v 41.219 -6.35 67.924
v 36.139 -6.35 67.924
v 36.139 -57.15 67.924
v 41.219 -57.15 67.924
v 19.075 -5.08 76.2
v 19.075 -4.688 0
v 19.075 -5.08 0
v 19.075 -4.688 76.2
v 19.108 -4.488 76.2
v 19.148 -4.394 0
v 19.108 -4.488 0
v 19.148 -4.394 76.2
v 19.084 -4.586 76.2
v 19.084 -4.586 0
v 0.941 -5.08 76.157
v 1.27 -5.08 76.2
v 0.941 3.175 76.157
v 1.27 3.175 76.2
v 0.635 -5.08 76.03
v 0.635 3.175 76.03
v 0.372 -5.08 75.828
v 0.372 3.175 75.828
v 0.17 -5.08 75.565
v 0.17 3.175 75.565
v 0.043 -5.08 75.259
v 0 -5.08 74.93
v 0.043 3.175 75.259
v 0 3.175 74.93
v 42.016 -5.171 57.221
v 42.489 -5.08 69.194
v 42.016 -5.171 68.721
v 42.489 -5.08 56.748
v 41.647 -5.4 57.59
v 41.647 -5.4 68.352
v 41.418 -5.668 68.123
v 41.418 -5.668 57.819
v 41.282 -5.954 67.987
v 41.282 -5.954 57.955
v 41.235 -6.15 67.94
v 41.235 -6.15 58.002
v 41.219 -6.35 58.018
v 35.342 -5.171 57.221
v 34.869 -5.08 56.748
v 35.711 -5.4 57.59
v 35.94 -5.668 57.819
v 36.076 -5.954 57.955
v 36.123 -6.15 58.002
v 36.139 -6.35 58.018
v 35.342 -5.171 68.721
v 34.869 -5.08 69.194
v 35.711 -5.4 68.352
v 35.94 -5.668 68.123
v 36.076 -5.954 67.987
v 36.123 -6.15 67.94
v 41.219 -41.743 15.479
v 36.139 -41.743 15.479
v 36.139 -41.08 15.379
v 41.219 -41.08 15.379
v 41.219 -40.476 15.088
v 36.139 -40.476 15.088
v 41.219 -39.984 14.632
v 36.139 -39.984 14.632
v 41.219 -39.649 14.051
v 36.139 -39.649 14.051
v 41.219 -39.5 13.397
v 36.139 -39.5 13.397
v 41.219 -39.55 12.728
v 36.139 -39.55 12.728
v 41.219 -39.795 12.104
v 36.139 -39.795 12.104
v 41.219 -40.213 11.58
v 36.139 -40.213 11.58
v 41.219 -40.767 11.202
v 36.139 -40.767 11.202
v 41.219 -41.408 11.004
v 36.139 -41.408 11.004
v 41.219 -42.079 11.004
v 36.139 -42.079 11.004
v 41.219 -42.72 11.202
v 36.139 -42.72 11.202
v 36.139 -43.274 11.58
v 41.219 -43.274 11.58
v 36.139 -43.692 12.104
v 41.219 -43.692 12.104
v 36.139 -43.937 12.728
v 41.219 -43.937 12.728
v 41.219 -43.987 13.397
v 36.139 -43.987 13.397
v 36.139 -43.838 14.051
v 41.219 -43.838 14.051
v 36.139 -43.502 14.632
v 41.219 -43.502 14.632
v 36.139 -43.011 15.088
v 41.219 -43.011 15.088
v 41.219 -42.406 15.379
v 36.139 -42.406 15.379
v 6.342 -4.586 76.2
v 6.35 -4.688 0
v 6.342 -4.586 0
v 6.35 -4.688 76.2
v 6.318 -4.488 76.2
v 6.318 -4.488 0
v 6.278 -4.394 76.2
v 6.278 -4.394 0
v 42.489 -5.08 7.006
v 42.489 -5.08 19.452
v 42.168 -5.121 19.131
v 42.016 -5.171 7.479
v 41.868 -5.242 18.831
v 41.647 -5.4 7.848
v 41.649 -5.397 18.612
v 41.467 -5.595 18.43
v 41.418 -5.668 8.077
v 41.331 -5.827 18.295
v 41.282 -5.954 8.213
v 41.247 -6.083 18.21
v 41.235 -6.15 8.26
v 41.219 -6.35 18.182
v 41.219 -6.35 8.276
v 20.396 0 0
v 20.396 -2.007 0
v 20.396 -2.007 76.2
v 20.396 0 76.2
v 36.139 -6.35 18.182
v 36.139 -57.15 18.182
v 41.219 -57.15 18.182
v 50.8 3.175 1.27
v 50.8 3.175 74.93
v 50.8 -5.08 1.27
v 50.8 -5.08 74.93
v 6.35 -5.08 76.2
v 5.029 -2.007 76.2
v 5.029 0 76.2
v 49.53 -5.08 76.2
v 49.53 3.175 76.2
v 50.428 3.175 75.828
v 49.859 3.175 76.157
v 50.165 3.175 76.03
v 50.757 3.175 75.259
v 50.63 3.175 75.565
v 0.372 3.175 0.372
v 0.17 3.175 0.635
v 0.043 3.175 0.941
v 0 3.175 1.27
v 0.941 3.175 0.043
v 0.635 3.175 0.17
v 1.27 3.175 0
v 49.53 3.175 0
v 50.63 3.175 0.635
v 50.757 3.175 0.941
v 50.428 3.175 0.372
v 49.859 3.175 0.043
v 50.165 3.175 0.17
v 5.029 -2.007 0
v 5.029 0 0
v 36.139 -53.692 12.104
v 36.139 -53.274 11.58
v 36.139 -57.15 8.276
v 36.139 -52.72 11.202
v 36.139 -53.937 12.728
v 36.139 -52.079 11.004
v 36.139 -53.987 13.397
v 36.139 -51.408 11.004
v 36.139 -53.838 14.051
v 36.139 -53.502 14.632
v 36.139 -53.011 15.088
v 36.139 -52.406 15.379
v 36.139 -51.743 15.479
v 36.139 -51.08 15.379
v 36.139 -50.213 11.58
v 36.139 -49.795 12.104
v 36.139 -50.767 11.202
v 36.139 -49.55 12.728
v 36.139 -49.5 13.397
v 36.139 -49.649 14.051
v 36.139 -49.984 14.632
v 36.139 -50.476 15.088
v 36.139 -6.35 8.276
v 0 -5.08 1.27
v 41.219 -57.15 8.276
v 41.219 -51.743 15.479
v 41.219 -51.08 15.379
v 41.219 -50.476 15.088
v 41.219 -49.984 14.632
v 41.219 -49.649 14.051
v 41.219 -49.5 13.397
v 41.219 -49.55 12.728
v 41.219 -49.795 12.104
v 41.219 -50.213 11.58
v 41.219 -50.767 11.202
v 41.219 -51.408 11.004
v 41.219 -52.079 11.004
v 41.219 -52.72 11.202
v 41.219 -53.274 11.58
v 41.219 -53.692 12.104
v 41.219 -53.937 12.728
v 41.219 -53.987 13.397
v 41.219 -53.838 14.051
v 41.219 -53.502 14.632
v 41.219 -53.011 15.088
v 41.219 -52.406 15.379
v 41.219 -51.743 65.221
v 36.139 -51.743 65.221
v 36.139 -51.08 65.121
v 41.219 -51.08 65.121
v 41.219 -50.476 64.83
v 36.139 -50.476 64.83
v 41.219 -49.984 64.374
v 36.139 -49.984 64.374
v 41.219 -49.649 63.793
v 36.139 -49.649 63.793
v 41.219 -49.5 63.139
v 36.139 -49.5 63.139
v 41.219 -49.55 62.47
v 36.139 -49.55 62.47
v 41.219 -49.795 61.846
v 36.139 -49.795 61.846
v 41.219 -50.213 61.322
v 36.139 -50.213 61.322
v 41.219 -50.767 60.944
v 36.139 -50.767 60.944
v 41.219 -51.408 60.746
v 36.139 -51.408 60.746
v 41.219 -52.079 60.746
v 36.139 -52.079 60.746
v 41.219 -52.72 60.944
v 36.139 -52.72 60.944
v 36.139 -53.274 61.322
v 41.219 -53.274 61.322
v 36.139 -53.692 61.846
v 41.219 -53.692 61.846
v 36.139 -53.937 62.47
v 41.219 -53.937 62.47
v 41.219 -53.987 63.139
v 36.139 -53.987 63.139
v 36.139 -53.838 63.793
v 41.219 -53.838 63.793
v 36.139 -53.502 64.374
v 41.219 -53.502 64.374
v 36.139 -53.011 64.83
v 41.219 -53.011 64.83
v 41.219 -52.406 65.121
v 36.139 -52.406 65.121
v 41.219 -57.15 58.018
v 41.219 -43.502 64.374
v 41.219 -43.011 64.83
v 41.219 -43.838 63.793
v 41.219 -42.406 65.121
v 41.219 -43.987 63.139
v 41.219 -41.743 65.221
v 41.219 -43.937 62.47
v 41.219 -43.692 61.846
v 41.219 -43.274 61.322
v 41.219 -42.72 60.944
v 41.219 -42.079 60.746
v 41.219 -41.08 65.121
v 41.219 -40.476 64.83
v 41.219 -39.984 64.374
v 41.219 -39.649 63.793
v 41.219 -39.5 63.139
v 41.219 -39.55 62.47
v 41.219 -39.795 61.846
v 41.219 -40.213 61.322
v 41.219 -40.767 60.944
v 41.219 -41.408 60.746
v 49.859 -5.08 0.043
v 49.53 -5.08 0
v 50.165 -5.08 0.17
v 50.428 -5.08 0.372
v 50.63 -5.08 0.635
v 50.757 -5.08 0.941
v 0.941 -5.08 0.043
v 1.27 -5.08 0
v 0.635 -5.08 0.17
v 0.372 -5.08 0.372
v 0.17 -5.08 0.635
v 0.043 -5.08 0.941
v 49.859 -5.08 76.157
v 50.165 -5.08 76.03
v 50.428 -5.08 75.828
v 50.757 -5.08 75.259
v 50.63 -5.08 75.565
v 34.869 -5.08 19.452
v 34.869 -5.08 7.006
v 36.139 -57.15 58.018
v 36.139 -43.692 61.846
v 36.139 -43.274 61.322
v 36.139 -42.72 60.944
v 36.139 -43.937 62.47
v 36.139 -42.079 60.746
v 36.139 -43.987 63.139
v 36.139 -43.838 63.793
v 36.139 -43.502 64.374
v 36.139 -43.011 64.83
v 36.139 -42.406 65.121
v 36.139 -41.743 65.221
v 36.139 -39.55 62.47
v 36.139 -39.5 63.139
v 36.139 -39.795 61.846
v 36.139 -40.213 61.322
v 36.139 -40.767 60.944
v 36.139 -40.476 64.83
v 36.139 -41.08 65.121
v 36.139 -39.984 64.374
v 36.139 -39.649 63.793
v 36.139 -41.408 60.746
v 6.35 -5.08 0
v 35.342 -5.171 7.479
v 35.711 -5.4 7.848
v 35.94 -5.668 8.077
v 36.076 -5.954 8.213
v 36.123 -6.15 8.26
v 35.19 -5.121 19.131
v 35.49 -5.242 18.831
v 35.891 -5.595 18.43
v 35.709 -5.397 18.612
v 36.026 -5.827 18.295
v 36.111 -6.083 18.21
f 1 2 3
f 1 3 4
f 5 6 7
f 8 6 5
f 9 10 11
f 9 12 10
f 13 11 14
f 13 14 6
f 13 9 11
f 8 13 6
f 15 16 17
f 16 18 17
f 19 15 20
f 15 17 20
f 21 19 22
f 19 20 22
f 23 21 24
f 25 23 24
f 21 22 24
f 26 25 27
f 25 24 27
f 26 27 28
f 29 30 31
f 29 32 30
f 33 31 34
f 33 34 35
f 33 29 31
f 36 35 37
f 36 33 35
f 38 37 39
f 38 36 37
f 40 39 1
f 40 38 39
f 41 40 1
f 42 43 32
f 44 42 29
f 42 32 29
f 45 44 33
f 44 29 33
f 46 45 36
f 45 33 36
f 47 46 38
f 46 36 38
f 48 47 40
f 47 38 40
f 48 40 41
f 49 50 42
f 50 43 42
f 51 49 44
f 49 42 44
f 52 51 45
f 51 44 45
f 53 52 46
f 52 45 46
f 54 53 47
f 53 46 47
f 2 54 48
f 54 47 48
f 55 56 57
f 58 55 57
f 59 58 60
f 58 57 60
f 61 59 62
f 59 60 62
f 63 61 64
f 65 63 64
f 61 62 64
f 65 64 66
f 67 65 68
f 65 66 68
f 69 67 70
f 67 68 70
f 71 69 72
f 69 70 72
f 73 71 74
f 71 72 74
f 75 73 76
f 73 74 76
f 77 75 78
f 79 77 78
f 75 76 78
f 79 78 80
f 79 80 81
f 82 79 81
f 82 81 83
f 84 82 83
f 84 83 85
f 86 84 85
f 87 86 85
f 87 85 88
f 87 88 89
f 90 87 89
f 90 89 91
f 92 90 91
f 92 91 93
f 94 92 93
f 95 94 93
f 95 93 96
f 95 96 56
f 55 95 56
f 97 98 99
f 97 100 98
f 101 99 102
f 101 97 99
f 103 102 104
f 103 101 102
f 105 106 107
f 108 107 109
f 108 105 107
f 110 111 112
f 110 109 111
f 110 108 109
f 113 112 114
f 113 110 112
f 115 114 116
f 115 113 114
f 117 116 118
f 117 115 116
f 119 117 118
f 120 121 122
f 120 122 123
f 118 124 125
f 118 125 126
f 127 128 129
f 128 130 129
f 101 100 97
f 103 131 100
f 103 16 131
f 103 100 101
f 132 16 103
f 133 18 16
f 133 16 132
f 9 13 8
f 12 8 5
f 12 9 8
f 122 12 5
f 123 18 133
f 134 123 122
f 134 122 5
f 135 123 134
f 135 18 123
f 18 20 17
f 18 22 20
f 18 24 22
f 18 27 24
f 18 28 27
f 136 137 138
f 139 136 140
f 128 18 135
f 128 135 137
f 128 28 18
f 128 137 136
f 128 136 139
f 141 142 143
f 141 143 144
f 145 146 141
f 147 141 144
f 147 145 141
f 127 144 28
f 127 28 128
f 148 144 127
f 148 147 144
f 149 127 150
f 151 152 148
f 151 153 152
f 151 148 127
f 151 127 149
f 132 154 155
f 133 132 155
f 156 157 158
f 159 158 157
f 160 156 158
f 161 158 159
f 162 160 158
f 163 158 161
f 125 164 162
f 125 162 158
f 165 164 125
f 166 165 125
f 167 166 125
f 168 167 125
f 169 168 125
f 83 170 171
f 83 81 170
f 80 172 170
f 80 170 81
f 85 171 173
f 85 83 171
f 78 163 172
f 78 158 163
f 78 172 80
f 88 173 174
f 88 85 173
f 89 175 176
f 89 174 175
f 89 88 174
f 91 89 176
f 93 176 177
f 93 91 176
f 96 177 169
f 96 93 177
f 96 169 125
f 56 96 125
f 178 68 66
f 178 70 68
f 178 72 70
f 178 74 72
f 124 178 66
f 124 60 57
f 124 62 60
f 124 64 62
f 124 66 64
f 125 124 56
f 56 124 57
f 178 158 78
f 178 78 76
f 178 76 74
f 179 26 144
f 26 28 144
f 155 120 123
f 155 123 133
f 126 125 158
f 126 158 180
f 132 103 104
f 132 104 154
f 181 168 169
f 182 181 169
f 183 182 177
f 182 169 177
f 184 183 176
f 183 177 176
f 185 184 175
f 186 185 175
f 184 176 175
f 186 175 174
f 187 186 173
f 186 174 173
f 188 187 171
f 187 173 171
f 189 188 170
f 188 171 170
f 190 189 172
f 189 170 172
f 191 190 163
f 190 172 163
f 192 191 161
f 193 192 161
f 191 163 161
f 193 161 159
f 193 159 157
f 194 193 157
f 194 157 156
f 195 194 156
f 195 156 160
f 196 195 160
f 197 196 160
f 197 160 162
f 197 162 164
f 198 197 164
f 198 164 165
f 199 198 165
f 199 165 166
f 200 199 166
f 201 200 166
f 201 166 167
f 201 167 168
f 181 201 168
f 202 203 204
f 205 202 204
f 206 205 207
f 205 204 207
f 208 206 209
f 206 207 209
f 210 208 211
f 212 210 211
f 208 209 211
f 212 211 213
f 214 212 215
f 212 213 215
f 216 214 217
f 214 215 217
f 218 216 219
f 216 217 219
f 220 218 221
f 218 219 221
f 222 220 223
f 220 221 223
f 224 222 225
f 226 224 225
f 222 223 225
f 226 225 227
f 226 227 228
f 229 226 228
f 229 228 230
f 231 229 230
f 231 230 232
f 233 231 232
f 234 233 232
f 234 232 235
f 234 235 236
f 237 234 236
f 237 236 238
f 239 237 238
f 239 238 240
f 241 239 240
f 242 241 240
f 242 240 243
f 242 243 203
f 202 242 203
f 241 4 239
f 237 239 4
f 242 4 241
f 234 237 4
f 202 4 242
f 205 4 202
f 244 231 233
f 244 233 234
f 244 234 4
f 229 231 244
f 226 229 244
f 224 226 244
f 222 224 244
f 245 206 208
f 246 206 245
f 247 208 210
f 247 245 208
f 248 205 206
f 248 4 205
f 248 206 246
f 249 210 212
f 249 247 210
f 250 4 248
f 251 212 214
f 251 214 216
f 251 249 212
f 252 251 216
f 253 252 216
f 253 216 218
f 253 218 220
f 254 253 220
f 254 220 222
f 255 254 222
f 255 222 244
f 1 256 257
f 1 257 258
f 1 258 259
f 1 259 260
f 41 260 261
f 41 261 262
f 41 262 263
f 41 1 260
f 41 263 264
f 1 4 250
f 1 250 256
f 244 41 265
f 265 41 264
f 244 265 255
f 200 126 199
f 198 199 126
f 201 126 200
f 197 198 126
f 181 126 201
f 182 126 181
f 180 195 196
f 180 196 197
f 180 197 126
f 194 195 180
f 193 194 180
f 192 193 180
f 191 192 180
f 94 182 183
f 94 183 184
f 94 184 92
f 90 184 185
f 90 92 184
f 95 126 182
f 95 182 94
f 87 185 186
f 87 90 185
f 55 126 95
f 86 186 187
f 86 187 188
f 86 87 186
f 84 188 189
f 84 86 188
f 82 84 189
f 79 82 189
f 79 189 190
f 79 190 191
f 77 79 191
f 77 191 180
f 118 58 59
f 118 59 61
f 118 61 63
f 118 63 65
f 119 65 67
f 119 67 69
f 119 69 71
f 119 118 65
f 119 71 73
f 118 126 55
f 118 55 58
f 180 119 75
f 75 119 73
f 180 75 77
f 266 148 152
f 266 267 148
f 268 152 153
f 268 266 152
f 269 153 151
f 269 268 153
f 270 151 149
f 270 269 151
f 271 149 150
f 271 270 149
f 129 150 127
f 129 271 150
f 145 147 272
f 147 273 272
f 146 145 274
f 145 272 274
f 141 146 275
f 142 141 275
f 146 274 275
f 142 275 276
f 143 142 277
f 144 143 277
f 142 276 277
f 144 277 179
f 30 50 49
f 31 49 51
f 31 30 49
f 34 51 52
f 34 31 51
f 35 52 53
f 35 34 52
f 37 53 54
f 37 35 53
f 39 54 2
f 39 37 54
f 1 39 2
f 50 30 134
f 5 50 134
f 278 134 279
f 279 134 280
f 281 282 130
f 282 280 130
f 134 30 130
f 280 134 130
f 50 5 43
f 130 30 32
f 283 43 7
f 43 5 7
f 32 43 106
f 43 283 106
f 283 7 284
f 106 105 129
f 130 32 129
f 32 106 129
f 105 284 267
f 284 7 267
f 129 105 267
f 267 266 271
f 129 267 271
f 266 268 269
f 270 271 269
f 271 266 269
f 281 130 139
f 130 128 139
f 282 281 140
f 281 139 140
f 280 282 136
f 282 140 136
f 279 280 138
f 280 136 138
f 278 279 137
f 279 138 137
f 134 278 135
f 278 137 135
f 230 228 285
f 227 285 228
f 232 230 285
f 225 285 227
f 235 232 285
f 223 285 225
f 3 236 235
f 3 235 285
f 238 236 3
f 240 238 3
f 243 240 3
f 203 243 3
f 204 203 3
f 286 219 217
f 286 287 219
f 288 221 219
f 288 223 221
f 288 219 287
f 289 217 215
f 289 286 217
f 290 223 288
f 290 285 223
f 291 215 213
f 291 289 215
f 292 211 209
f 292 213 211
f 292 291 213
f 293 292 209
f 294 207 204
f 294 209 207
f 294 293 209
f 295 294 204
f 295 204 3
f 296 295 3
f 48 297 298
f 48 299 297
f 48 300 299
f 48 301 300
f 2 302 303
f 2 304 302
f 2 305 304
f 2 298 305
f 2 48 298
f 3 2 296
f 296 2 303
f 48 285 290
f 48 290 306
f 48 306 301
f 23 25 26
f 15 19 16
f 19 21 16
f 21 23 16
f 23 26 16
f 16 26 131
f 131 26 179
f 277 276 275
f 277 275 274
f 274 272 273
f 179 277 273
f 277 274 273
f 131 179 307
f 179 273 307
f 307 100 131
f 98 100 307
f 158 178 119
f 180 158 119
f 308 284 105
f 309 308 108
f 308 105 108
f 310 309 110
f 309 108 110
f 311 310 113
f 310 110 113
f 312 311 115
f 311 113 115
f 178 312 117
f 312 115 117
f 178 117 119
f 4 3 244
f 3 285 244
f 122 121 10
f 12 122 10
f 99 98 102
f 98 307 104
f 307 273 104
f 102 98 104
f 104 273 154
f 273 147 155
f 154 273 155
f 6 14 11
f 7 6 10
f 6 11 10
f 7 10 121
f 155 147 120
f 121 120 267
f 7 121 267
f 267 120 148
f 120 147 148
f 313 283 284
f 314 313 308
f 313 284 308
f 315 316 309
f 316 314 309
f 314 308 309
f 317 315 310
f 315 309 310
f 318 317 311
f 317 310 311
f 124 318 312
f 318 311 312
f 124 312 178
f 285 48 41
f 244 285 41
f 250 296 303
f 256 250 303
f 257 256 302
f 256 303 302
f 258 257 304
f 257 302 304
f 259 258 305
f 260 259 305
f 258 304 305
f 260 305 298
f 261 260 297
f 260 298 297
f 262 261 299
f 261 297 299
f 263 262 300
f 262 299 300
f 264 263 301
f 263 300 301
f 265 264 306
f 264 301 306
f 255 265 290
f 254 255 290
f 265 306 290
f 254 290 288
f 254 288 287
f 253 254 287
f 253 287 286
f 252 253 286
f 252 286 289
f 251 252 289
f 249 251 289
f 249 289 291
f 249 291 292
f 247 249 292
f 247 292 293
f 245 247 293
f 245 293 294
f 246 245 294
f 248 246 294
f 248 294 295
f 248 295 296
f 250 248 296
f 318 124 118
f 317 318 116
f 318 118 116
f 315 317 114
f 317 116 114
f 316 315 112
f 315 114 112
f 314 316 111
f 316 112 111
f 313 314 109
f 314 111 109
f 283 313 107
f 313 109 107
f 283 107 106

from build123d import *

# Parameters (mm, degrees)
SKETCH2_W           = 50.8
SKETCH2_H           = 76.2
BOSS_EXTRUDE1_DEPTH = 3.175
SKETCH2_5_W         = 6.35
SKETCH2_5_H         = 76.2
SKETCH2_5_W_2       = 5.08
SKETCH2_5_H_2       = 9.906
BOSS_EXTRUDE2_DEPTH = 5.08
SKETCH2_6_W         = 5.08
SKETCH2_6_H         = 9.906
BOSS_EXTRUDE3_DEPTH = 57.15
SKETCH4_R           = 2.249999945
CUT_EXTRUDE1_DEPTH  = 50.8
FILLET1_R           = 1.27
CUT_EXTRUDE2_DEPTH  = 101.6
FILLET2_R           = 0.635


with BuildPart() as part:
    # Sketch2 → Boss-Extrude1 (new body)
    with BuildSketch(Plane(origin=(0, 0, 0), x_dir=(1, 0, 0), z_dir=(0, 1, 0))):
        with Locations((25.4, -38.1)):
            Rectangle(SKETCH2_W, SKETCH2_H)
    extrude(amount=BOSS_EXTRUDE1_DEPTH)

    # Sketch2<5> → Boss-Extrude2 (add)
    # profile 1 of 2: a face of its own
    with BuildSketch(Plane(origin=(0, 0, 0), x_dir=(1, 0, 0), z_dir=(0, 1, 0))):
        with Locations((3.175, -38.1)):
            Rectangle(SKETCH2_5_W, SKETCH2_5_H)
    # profile 2 of 2: a face of its own
    with BuildSketch(Plane(origin=(0, 0, 0), x_dir=(1, 0, 0), z_dir=(0, 1, 0))):
        Polygon((50.8, 0), (19.0754, 0), (19.0754, -38.1), (19.0754, -76.2), (50.8, -76.2), align=None)
        with Locations((38.678980046, -62.970991406)):
            Rectangle(SKETCH2_5_W_2, SKETCH2_5_H_2, mode=Mode.SUBTRACT)
        with Locations((38.678980046, -13.229008594)):
            Rectangle(SKETCH2_5_W_2, SKETCH2_5_H_2, mode=Mode.SUBTRACT)
    extrude(amount=-BOSS_EXTRUDE2_DEPTH)

    # Sketch2<6> → Boss-Extrude3 (add)
    with BuildSketch(Plane(origin=(0, 0, 0), x_dir=(1, 0, 0), z_dir=(0, 1, 0))):
        with Locations((38.678980046, -13.229008594)):
            Rectangle(SKETCH2_6_W, SKETCH2_6_H)
        with Locations((38.678980046, -62.970991406)):
            Rectangle(SKETCH2_6_W, SKETCH2_6_H)
    extrude(amount=-BOSS_EXTRUDE3_DEPTH)

    # Sketch4 → Cut-Extrude1 (cut)
    with BuildSketch(Plane.ZY.offset(-36.138980046)):
        with Locations((13.229008594, -41.743296244)):
            Circle(SKETCH4_R)
        with Locations((13.229008594, -51.743296056)):
            Circle(SKETCH4_R)
        with Locations((62.970991406, -41.743296244)):
            Circle(SKETCH4_R)
        with Locations((62.970991406, -51.743296056)):
            Circle(SKETCH4_R)
    extrude(amount=-CUT_EXTRUDE1_DEPTH, mode=Mode.SUBTRACT)

    # Fillet1
    fillet1_edges = [part.edges().sort_by_distance(p)[0] for p in [
        (0, -0.9525, 0),
        (0, -0.9525, 76.2),
        (50.8, -0.9525, 76.2),
        (50.8, -0.9525, 0),
        (38.678980046, -5.08, 67.923991406),
        (36.138980046, -5.08, 62.970991406),
        (38.678980046, -5.08, 58.017991406),
        (41.218980046, -5.08, 13.229008594),
        (36.138980046, -5.08, 13.229008594),
        (38.678980046, -5.08, 8.276008594),
        (41.218980046, -5.08, 62.970991406),
        (38.678980046, -5.08, 18.182008594),
    ]]
    fillet(fillet1_edges, radius=FILLET1_R)

    # Sketch5 → Cut-Extrude2 (cut)
    with BuildSketch(Plane(origin=(0, 0, 0), x_dir=(-1, 0, 0), z_dir=(0, 0, -1))):
        Polygon((-19.0754, 0), (-20.3962, 0), (-20.3962, -2.0066), (-19.0754, -4.532028908), align=None)
        Polygon((-5.0292, 0), (-6.35, 0), (-6.35, -4.532028908), (-5.0292, -2.0066), align=None)
    extrude(amount=-CUT_EXTRUDE2_DEPTH, mode=Mode.SUBTRACT)

    # Fillet2
    fillet2_edges = [part.edges().sort_by_distance(p)[0] for p in [
        (19.0754, -4.532028908, 38.1),
        (6.35, -4.532028908, 38.1),
    ]]
    fillet(fillet2_edges, radius=FILLET2_R)


solid = part.part
